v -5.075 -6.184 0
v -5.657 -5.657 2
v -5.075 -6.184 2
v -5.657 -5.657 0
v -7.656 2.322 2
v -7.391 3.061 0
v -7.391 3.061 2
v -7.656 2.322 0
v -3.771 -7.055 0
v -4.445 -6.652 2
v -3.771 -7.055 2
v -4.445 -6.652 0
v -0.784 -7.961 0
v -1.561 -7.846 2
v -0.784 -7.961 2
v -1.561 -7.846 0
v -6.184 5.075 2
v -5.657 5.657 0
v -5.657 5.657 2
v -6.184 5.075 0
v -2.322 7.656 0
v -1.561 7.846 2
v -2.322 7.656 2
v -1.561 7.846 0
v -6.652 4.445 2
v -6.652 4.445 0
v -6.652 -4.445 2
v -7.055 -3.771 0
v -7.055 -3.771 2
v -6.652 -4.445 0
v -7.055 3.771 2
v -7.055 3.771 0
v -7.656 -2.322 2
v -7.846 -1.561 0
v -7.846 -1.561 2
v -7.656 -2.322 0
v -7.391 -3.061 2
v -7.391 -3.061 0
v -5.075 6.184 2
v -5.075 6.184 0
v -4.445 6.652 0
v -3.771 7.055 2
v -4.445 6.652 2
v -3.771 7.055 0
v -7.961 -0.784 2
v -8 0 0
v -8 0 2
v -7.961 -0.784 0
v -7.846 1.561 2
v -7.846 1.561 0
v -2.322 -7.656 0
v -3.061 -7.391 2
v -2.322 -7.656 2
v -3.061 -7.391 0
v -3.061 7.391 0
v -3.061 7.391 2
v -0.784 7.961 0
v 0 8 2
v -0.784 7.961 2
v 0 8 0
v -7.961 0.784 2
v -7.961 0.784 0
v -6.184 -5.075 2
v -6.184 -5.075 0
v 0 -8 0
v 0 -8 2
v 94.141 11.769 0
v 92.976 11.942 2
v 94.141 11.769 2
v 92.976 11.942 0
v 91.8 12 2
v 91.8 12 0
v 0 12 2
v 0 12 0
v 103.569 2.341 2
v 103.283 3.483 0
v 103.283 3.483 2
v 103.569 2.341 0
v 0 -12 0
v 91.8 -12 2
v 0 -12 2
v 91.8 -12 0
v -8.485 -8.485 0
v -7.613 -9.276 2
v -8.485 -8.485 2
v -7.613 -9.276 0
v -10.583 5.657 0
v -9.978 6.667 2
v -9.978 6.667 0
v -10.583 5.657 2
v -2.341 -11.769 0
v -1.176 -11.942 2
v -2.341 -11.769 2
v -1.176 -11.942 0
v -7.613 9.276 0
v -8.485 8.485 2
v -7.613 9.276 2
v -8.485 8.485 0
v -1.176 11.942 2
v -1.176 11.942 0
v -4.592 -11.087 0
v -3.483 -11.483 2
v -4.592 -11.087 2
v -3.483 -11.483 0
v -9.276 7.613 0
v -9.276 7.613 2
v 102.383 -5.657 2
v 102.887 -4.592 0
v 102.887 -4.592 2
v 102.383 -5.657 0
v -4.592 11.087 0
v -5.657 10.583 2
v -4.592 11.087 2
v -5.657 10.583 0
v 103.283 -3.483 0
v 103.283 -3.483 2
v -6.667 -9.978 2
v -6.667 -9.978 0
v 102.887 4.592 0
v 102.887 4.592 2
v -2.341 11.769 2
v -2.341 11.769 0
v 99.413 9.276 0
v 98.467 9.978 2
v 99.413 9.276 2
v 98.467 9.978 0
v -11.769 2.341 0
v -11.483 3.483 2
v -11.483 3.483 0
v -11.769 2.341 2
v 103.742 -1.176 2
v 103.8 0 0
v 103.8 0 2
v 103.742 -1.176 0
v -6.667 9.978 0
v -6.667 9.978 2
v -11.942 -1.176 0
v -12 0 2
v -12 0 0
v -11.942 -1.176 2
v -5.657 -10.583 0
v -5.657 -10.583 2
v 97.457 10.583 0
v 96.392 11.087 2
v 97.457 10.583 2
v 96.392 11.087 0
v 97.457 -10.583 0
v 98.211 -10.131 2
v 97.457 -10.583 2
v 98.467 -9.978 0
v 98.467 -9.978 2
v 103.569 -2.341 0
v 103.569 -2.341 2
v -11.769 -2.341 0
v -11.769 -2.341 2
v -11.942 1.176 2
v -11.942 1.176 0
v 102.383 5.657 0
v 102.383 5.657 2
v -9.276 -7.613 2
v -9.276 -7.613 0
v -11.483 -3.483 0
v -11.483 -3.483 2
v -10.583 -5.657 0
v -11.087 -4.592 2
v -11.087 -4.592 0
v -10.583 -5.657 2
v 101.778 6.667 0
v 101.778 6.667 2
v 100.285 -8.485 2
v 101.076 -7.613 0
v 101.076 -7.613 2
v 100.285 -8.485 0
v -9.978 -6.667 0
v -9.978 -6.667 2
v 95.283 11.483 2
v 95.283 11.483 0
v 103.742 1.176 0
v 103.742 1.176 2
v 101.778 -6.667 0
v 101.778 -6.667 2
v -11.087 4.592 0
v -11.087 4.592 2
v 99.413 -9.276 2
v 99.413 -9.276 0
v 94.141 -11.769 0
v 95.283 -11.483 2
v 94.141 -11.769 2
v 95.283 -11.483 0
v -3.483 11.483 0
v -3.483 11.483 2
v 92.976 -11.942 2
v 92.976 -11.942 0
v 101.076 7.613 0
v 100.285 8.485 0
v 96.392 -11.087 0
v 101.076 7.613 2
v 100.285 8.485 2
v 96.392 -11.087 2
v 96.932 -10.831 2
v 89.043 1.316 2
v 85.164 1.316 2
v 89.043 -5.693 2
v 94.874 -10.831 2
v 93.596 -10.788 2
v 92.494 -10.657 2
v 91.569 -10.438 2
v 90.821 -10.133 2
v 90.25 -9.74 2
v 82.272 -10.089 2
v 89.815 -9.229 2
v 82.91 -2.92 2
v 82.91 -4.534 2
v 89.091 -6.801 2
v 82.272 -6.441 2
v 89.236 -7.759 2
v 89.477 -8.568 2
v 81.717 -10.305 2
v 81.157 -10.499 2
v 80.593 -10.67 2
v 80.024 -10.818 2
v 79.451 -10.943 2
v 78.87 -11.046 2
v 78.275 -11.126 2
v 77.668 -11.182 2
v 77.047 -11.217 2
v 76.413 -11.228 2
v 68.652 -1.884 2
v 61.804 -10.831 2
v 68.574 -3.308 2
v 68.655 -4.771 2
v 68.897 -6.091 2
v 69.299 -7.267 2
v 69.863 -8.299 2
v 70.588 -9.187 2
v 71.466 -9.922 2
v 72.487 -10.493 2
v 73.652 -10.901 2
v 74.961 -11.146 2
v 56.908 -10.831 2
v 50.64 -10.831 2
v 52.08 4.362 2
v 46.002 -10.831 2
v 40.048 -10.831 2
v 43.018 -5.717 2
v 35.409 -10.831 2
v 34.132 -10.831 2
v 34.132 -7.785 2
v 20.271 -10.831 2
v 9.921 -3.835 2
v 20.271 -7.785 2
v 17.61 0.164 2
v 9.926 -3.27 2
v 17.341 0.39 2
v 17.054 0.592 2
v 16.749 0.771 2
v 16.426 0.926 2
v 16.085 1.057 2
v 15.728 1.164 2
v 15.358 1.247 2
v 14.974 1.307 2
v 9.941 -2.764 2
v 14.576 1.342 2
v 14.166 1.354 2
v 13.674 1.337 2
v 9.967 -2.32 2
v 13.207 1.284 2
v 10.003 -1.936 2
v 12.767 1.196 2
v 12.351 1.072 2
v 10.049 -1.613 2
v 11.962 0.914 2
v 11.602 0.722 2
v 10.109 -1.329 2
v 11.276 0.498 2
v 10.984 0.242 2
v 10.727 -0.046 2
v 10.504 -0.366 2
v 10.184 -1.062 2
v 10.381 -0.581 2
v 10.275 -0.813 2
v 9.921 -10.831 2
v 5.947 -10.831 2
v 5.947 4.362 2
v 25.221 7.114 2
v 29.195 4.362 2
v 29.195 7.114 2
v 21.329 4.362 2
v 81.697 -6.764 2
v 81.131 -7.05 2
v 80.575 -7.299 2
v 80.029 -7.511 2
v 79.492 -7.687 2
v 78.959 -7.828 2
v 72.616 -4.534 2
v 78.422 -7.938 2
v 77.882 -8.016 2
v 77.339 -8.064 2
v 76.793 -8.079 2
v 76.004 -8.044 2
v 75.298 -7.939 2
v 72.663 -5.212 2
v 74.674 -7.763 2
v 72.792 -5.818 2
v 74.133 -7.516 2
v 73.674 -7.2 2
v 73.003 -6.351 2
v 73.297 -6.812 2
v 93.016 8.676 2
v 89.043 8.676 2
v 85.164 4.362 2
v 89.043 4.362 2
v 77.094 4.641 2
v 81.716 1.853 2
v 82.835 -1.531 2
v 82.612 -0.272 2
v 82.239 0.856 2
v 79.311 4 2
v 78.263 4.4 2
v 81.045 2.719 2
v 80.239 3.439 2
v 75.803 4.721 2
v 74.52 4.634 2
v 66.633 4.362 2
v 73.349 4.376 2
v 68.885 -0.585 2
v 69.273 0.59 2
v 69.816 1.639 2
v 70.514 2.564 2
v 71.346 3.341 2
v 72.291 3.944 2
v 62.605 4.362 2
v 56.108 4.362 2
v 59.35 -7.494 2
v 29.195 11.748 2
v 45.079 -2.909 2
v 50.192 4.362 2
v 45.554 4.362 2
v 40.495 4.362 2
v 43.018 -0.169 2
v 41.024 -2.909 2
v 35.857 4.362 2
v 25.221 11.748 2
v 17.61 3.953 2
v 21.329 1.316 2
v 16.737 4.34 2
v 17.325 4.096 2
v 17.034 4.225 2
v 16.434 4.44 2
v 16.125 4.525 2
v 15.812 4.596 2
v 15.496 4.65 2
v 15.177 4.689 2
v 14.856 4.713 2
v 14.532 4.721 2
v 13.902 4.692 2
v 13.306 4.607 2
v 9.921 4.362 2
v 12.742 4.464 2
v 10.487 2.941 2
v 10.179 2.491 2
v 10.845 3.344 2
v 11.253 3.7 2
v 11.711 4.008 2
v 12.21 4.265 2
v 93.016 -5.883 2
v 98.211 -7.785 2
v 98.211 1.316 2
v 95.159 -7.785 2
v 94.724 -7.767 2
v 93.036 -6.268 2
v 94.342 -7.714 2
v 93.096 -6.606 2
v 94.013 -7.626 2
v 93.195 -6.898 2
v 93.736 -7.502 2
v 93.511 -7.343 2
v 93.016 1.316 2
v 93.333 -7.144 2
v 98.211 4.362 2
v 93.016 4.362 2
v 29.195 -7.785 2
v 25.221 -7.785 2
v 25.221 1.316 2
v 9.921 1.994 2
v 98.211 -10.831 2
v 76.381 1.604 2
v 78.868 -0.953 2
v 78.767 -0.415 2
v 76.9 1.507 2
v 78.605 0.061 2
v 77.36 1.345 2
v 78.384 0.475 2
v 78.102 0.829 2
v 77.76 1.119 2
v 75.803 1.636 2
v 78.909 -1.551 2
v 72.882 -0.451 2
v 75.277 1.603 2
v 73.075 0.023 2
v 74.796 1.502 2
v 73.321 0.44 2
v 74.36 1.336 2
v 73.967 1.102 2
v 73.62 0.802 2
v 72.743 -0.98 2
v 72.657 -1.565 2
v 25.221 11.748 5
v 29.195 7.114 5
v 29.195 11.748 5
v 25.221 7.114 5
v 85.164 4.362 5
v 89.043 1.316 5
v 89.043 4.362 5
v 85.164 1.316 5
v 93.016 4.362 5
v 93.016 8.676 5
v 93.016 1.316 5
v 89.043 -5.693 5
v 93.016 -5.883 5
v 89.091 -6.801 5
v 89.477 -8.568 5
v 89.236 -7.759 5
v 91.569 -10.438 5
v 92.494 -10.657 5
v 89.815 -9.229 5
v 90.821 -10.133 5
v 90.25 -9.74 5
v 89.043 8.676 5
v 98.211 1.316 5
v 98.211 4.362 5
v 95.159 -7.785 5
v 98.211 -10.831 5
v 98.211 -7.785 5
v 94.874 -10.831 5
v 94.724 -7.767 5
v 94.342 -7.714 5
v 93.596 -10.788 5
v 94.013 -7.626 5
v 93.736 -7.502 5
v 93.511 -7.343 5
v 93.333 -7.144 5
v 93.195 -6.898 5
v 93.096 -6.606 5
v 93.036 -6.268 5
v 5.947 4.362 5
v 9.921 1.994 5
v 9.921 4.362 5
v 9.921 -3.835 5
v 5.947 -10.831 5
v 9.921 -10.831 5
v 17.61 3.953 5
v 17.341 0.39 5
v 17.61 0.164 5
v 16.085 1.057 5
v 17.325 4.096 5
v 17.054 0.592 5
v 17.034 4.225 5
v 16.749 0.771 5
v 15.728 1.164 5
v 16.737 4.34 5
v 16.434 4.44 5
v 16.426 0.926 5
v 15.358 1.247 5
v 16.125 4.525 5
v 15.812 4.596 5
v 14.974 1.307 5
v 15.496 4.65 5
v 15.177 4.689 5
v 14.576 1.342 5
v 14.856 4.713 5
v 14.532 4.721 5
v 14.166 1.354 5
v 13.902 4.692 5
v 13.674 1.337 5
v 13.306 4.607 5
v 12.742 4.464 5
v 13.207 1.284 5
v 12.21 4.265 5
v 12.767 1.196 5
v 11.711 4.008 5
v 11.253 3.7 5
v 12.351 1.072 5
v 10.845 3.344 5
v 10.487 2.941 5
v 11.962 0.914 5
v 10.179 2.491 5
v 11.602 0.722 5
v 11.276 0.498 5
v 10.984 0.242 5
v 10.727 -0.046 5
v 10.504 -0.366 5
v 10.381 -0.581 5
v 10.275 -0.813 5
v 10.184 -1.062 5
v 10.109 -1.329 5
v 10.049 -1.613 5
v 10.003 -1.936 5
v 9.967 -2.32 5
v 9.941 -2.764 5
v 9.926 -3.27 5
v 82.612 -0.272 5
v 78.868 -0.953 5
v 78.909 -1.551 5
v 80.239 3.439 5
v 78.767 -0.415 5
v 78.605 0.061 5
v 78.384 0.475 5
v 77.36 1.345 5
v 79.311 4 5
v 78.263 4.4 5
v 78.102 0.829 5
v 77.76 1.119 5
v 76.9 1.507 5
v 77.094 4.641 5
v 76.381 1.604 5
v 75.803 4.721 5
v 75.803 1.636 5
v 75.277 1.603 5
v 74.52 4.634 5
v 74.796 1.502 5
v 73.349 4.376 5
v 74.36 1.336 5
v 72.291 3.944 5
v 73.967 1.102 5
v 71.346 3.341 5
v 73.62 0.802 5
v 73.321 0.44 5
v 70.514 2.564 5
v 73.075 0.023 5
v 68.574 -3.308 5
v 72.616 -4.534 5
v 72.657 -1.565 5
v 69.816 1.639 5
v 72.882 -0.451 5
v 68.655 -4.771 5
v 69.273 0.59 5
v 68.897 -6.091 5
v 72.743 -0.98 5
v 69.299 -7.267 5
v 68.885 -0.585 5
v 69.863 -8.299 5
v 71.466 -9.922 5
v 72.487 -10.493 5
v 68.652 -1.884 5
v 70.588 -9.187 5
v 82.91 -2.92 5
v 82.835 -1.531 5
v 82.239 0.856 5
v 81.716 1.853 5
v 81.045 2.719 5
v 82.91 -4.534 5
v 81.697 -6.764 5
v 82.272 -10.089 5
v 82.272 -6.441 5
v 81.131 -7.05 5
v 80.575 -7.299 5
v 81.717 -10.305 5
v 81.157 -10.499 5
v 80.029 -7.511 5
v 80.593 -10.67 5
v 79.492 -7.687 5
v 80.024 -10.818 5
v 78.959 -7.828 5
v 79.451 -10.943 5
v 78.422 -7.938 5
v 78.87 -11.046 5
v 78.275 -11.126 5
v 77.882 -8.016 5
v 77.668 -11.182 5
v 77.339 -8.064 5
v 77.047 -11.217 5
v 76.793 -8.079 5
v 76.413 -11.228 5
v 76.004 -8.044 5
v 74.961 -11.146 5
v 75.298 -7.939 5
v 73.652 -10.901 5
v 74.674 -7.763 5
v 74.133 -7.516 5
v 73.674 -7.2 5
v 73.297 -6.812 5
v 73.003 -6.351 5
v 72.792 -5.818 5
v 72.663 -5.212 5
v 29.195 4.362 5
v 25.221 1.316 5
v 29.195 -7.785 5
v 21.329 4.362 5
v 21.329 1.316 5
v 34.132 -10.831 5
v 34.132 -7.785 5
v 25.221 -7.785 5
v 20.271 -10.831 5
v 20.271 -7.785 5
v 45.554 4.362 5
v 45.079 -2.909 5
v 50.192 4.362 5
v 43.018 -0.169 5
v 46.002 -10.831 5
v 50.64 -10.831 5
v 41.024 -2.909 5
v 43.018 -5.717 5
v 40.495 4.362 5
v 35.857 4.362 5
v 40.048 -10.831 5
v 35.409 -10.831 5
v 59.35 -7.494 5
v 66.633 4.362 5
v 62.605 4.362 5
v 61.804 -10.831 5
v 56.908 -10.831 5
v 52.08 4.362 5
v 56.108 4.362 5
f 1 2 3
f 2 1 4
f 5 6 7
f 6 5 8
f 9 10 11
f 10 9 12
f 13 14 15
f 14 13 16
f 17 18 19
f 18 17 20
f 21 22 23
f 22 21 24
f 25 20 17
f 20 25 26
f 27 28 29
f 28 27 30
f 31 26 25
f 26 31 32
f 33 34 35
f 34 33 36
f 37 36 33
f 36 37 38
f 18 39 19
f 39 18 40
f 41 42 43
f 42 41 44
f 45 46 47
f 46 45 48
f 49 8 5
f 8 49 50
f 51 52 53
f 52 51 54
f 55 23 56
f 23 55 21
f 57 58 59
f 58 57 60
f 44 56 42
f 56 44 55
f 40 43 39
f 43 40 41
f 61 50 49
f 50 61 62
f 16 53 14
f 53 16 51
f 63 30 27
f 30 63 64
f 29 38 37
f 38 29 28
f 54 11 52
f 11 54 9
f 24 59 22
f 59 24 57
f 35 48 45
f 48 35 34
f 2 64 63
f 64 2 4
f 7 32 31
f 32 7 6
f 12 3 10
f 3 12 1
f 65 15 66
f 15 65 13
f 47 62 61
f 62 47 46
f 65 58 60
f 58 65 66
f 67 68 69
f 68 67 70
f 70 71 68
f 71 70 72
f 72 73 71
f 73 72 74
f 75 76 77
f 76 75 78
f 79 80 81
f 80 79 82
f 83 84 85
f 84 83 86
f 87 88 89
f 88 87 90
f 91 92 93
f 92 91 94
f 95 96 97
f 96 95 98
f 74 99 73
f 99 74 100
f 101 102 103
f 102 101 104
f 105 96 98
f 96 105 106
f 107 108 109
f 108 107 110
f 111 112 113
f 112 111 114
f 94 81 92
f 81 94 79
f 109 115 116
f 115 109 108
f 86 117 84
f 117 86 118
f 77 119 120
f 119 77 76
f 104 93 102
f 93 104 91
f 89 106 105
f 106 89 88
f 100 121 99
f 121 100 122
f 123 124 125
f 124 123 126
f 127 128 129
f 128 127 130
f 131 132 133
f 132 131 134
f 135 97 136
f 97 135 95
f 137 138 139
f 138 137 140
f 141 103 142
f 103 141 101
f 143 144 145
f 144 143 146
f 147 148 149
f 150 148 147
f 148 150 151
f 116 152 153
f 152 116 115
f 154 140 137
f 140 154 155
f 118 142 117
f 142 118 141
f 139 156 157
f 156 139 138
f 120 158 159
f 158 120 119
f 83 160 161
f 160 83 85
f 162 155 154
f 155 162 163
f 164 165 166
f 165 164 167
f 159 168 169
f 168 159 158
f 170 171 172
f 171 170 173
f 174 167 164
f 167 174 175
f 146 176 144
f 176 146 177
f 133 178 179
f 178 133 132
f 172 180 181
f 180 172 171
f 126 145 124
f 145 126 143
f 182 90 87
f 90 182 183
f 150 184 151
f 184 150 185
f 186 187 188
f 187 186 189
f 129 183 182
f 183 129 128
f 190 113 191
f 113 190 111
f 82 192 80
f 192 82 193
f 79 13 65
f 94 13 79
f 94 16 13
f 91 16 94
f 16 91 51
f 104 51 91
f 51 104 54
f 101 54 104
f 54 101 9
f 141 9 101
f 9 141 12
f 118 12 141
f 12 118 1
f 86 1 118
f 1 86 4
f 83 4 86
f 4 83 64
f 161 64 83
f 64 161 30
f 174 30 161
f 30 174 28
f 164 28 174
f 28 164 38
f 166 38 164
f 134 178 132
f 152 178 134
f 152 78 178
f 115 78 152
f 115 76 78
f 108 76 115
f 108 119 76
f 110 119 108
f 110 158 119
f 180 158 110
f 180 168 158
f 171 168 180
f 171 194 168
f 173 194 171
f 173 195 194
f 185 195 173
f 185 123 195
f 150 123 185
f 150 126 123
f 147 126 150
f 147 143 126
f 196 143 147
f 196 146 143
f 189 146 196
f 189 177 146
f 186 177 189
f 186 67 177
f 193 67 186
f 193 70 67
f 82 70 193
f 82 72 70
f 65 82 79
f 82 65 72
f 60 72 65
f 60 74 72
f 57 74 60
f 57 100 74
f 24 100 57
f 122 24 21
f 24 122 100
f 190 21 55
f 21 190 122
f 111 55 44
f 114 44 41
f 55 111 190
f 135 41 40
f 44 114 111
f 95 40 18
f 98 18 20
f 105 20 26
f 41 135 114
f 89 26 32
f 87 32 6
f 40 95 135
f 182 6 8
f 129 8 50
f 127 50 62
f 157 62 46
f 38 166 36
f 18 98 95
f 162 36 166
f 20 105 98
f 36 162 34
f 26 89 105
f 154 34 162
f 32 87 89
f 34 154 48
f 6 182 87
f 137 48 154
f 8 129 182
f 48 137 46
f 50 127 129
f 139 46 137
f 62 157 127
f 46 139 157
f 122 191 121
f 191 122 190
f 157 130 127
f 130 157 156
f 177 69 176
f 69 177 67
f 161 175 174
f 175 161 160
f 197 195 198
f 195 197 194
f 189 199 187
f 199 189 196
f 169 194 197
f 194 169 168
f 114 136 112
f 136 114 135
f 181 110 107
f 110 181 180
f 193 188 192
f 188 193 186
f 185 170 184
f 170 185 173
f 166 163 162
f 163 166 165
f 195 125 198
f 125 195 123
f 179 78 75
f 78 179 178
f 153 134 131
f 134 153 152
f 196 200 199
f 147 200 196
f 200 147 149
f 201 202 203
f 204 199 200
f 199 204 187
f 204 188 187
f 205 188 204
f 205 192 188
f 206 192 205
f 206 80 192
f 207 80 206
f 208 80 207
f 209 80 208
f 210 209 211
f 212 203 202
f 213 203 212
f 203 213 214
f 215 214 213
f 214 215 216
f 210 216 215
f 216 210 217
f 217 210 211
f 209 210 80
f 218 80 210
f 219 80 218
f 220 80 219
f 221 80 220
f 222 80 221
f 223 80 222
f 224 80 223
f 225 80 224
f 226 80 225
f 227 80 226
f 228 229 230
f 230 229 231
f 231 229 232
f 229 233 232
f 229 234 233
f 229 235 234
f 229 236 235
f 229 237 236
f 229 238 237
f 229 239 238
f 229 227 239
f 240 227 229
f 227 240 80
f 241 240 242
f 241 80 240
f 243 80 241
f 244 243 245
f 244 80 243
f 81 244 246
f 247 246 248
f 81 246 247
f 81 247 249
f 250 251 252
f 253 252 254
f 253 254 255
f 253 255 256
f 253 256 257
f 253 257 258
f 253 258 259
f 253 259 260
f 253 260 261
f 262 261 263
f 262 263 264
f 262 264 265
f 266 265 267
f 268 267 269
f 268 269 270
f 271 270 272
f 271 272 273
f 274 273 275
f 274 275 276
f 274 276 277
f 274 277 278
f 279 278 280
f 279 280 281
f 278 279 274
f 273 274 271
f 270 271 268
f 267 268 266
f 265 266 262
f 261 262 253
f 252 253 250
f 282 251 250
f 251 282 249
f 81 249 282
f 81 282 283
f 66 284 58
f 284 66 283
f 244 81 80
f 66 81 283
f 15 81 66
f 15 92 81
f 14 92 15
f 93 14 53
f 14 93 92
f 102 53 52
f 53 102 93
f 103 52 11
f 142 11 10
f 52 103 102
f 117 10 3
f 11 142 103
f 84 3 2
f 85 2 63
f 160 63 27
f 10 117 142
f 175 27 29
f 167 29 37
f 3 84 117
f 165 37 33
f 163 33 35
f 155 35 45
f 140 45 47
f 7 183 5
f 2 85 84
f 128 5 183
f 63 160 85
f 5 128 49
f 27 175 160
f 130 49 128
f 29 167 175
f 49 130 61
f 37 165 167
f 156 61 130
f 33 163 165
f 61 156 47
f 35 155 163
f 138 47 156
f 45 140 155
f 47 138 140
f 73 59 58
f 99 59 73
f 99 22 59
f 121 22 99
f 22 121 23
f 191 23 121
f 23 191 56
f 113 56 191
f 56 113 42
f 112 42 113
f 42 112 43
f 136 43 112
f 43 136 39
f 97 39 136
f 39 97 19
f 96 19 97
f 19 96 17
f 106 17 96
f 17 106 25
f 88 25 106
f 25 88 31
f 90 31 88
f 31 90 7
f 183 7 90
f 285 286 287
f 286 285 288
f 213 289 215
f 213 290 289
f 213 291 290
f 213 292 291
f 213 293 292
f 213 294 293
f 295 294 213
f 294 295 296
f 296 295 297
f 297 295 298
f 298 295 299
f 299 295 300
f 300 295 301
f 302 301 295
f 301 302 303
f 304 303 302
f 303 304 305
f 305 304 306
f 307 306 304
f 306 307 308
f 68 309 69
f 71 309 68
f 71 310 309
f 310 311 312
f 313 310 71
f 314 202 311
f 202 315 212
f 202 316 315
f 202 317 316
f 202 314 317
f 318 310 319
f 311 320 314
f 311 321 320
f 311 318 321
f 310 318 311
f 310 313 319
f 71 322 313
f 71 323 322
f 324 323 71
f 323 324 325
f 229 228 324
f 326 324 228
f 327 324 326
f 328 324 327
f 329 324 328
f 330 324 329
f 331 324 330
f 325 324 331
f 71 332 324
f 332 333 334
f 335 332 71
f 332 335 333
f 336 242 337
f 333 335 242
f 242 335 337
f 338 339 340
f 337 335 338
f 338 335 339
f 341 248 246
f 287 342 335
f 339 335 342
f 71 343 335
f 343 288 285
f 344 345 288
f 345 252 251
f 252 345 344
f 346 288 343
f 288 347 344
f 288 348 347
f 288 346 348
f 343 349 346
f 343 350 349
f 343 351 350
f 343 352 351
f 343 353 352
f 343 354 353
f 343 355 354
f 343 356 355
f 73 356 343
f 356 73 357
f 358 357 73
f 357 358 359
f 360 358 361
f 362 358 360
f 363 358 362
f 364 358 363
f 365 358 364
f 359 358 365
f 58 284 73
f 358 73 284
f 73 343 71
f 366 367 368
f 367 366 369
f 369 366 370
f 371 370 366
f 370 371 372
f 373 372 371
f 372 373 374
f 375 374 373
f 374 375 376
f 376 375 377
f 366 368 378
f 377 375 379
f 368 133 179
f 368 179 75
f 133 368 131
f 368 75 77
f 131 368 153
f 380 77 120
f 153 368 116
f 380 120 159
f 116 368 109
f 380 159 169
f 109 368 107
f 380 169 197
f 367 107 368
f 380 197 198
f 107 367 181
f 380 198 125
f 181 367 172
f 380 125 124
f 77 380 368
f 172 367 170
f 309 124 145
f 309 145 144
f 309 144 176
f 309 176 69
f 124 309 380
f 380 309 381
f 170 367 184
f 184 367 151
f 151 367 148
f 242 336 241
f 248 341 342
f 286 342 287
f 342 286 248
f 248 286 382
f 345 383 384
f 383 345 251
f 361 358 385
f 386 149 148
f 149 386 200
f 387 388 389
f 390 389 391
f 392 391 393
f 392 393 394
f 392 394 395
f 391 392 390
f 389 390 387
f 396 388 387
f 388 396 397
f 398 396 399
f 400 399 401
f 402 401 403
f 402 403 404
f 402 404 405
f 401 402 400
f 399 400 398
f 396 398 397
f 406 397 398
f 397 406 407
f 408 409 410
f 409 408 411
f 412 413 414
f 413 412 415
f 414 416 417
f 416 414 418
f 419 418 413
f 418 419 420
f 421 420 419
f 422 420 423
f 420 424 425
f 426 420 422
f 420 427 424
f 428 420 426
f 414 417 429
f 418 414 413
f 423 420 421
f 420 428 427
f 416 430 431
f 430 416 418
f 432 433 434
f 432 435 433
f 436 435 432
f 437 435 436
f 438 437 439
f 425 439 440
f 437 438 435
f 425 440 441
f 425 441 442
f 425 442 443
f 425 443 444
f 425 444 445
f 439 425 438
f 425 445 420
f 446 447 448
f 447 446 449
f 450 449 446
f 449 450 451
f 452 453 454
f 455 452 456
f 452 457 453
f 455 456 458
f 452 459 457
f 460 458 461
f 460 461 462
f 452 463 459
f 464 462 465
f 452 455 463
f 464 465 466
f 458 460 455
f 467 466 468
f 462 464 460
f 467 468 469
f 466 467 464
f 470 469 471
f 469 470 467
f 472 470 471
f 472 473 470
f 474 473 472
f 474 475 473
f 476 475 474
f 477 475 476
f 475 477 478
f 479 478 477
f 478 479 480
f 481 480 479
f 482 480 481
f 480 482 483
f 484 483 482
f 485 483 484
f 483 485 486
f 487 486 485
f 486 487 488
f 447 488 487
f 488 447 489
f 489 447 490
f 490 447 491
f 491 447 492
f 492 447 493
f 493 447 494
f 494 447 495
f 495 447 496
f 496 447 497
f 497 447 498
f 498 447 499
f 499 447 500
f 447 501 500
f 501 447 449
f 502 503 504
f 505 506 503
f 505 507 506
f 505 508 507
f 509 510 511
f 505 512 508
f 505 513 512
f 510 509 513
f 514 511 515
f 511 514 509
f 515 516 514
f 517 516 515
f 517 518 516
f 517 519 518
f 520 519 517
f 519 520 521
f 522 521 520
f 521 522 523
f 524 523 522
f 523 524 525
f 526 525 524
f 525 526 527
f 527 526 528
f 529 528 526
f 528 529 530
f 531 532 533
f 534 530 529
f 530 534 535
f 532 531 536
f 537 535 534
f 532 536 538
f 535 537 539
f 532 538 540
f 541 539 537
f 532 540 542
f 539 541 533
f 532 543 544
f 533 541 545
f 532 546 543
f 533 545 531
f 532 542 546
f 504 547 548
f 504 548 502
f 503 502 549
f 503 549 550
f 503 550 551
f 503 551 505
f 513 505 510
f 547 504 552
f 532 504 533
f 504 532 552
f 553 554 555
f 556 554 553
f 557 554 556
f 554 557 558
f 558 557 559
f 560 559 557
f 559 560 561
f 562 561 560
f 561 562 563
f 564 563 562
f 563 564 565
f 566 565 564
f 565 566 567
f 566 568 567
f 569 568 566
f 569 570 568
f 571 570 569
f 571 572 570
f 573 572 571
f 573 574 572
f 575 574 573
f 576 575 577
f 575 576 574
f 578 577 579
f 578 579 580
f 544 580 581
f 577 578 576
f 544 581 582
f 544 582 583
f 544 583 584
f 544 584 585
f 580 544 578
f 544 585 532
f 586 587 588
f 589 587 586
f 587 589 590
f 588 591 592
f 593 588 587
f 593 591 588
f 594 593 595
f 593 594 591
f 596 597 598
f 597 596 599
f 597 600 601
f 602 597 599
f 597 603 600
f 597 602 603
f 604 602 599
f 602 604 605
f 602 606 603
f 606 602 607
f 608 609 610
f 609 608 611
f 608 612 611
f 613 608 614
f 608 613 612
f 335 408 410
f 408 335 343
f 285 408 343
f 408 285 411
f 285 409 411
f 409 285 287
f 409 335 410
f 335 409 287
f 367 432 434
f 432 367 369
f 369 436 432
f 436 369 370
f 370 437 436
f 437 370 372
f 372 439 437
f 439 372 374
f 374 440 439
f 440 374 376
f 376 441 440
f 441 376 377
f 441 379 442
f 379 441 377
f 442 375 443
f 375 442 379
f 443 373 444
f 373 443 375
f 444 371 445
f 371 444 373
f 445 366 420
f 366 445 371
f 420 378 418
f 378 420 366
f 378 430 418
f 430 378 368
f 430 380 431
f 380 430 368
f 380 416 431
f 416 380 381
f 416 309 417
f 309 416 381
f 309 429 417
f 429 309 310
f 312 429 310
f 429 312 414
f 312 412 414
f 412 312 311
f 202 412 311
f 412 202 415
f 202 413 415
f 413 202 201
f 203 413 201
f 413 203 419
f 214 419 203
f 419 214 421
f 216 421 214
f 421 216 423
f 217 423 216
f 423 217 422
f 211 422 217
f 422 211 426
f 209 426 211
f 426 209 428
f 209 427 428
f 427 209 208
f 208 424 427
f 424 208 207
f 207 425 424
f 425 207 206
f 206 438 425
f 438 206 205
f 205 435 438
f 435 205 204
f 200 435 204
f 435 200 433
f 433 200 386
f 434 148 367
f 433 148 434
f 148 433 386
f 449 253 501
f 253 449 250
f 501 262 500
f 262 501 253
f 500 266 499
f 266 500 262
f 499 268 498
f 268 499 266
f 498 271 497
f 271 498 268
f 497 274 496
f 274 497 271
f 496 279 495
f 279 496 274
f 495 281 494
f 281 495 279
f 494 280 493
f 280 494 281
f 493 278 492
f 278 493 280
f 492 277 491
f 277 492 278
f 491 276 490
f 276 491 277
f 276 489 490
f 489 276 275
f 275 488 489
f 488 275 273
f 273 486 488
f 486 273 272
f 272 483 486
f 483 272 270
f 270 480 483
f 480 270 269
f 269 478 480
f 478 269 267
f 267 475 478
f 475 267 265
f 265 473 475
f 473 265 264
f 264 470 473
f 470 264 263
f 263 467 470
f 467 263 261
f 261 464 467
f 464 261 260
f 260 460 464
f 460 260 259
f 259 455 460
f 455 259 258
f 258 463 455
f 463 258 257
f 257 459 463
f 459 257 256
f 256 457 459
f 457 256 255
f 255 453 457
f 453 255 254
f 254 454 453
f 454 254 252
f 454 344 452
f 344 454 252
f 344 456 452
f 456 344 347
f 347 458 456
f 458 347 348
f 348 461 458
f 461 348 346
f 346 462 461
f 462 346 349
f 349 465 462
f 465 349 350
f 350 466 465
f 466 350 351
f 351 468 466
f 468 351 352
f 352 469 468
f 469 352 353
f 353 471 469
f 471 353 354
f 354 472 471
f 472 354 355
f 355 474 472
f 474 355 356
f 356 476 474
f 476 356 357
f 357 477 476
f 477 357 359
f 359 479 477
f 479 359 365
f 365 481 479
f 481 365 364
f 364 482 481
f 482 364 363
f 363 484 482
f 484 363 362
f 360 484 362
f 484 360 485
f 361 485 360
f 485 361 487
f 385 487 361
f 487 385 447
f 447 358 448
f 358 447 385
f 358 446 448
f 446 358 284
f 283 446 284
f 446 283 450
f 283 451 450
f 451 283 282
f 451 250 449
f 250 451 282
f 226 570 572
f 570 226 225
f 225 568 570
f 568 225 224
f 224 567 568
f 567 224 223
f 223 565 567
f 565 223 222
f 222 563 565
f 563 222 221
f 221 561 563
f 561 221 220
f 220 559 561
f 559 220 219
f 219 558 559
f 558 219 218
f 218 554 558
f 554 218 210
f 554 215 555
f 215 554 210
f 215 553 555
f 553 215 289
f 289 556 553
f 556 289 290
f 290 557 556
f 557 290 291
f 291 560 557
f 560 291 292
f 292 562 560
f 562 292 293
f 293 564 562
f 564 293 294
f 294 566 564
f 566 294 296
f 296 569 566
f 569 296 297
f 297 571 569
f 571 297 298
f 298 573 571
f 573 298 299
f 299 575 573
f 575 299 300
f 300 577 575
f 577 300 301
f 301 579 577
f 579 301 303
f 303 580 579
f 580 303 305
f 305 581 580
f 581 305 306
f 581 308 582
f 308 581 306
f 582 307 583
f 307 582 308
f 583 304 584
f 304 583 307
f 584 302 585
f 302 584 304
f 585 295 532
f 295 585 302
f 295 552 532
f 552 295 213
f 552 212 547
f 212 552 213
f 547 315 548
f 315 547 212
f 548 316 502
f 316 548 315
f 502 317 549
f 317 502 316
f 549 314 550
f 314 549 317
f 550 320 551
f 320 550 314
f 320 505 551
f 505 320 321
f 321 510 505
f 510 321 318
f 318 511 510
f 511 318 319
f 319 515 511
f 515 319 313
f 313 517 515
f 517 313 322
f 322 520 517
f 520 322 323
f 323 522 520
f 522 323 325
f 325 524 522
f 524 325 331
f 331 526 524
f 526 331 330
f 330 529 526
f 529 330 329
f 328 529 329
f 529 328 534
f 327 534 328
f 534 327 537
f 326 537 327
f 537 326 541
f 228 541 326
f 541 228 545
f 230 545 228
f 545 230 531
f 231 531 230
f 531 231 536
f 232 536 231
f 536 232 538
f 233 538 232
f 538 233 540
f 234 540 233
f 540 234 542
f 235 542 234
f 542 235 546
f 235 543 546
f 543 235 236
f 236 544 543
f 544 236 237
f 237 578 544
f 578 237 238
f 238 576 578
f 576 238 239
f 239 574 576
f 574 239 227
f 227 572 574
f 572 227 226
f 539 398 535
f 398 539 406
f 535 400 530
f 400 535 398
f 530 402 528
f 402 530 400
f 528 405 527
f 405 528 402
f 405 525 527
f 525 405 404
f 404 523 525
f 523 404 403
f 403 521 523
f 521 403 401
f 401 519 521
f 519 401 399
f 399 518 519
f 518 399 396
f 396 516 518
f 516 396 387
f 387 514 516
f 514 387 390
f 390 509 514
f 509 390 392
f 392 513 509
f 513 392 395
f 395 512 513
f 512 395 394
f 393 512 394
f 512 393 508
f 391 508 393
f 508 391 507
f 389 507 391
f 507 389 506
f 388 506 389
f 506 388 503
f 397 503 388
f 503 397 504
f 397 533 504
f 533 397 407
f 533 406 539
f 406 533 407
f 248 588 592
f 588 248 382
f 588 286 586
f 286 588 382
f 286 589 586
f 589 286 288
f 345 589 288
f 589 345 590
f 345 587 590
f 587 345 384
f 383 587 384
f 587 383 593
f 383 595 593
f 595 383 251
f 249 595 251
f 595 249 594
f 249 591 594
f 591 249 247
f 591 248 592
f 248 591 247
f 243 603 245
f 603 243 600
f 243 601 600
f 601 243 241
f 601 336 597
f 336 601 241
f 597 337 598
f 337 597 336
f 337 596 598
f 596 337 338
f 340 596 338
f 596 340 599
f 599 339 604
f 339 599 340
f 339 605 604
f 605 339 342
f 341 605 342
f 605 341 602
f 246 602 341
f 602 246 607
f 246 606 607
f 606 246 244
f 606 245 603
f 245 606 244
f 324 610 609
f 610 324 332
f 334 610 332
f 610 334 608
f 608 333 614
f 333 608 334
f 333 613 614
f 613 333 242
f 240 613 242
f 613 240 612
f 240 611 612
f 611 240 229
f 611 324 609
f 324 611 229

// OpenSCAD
/* Parametric ID tag
 *
 * URL: https://github.com/rixvet/print3D-OpenSCAD
 * License: CC-BY-SA-4.0 license 
 * 
 */

/* [General Parameters] */

// Name to display
tag = "rixvet";

// Width of badge (-1: auto-tune for Consolas Font)
width = -1; //[-1:1:200]

// Thickness of badge
thickness = 2;

// Margin between letters and edge
margin = 2;

/* [Hook] */
hook_type = "half_circle"; // ["circle", "half_circle", "none"]

// Thickness of hook
hook_thickness = 4; // [0.1:0.1:10]

/* [Font] */
// Font Family (Help->'Font List' has more options)
font_family = "Consolas"; // ["Consolas", "Liberation Sans"]

// Font Style (Help->'Font List' has more options)
font_style = "Bold"; // ["Bold", "Italic", "Bold Italic"]

// Font size
font_size = 20; // [1:1:60]

// Height of relief letters
font_height = 3;

/* [Other] */
$fn = 64;


// Helper to create 3D text with correct font and orientation
module t(t, spacing = 1) {
  rotate([0, 0, 0])
    linear_extrude(height = font_height)
      text(t, font_size,
           spacing=spacing,
           valign="center",
           font = str(font_family, ":style=", font_style),
           $fn = 32);
}

module green() color([157/255,203/255,81/255]) children();


module badge(font_size, width, font_height) {
    difference(){
        hull() {
            translate([(hook_type=="circle") ? -(font_size/2)+margin: 0,0,0]) cylinder(h=thickness, r=(font_size/2) + margin);
            translate([width,0,0]) cylinder(h=thickness, r=(font_size/2) + margin);
        }
        if (hook_type == "half_circle") {
            translate([0,0,-1]) difference() {
                // Half circle
                cylinder(h=thickness*4, r=(font_size/2) + margin - hook_thickness);
                translate([0,-font_size*2,-2]) cube([font_size*4, font_size*4, thickness*8]);
            }
        }
        else if (hook_type == "circle") {
            translate([-(font_size/2)+margin,0,-1]) cylinder(h=thickness*4, r=(font_size/2) + margin - hook_thickness);    
        }
    }
    translate([margin,0,thickness]) green() t(tag);

}

if (width == -1) {
    // Consolas font
    // size 20: space 4, font 12
    // size 10: space 2: font 6
    auto_width = len(tag) * font_size * 0.765;
    echo("Calculated width: ", auto_width);
    badge(font_size, auto_width, font_height);
} else {
    badge(font_size, width, font_height);
}
